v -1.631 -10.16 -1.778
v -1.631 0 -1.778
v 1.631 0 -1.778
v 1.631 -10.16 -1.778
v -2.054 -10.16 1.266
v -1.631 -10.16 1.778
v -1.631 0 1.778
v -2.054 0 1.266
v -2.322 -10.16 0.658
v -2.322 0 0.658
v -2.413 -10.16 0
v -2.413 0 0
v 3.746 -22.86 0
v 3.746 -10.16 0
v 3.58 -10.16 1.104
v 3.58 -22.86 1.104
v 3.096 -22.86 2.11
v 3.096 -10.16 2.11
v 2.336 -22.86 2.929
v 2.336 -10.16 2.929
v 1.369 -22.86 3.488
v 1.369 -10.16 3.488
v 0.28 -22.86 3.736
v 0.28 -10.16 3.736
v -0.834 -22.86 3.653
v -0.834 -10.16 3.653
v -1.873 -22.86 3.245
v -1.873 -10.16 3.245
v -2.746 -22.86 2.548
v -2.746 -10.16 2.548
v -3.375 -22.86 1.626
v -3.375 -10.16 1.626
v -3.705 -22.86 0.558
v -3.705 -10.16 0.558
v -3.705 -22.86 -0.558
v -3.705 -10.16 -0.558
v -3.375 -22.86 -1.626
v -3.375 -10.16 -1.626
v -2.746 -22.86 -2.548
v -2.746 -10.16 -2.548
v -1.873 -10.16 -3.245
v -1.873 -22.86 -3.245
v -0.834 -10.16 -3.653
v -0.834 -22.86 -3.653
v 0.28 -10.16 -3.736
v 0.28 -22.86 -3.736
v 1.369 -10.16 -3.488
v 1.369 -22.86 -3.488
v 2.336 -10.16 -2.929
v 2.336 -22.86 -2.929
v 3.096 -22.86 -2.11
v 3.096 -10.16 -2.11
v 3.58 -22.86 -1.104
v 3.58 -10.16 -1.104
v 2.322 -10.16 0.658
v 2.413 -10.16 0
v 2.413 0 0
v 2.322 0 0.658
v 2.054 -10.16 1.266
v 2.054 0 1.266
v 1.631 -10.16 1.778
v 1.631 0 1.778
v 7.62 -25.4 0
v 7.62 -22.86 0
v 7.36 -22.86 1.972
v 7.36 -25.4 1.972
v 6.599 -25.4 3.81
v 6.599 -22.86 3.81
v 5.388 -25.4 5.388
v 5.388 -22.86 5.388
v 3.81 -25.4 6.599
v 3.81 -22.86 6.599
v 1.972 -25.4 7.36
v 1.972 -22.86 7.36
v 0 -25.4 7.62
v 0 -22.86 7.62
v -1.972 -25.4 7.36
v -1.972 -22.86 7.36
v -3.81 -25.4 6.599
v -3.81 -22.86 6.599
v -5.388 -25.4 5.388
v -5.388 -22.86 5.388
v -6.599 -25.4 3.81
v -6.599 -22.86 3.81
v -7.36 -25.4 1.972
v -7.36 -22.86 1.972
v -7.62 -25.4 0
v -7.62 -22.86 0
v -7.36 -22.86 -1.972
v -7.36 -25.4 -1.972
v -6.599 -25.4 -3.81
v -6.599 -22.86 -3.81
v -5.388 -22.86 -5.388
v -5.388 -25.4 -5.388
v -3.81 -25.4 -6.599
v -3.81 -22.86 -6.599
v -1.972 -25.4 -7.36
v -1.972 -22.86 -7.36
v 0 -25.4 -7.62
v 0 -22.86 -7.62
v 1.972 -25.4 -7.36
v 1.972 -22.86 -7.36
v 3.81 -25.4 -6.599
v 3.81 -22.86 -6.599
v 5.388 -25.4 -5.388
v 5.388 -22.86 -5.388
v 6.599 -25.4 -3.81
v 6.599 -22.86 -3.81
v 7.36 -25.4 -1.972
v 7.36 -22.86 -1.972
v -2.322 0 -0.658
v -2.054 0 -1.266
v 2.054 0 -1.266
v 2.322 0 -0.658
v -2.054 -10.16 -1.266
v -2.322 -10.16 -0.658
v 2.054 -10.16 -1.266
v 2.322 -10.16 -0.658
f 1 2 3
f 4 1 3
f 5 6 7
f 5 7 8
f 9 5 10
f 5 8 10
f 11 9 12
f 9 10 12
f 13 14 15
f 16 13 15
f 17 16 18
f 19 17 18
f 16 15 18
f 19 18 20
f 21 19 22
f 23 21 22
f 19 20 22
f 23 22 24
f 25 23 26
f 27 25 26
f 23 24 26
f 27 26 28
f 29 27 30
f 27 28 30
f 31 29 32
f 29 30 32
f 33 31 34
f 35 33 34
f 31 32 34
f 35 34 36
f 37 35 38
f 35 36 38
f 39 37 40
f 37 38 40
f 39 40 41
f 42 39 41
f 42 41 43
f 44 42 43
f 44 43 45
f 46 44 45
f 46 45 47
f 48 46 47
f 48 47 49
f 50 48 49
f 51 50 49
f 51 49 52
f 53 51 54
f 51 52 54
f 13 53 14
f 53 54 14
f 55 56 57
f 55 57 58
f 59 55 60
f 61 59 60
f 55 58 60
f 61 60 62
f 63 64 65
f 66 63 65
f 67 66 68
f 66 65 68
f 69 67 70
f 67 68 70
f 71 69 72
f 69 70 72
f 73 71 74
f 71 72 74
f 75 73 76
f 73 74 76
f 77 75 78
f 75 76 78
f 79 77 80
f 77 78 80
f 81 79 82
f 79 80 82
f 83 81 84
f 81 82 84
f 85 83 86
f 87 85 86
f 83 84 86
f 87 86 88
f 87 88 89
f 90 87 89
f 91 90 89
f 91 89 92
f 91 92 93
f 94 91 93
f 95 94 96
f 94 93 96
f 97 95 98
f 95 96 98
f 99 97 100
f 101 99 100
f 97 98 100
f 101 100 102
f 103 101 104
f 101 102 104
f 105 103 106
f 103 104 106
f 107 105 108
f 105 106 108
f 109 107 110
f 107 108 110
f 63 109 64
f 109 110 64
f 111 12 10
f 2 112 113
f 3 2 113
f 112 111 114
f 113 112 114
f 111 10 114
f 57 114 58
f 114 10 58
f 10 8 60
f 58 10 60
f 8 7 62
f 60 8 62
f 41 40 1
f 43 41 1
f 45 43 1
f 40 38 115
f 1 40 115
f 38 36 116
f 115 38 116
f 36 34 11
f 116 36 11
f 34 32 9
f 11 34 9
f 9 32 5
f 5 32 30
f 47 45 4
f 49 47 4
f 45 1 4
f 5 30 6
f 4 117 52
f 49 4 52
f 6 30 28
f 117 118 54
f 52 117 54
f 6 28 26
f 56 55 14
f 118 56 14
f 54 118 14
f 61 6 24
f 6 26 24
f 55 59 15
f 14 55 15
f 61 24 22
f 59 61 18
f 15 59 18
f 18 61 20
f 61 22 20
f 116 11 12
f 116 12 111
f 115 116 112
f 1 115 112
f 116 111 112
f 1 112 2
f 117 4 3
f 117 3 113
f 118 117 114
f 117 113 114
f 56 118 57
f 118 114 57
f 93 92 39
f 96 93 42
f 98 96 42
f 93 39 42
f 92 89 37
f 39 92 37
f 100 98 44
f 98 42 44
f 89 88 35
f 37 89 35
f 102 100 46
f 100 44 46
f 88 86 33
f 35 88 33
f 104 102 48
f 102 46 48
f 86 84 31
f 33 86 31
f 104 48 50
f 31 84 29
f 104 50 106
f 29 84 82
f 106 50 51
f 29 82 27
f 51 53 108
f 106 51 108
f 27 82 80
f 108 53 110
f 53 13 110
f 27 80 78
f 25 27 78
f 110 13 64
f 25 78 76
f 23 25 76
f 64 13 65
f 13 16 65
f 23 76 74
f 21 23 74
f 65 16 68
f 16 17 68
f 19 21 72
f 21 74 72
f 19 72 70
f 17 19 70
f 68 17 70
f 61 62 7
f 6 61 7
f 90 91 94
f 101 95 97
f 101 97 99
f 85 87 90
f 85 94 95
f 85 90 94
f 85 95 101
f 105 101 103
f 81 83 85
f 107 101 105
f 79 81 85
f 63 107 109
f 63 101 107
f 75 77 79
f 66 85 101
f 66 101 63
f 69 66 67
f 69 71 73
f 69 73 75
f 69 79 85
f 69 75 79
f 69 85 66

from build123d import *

# Parameters (mm, degrees)
F1_DEPTH = 10.16
F2_R     = 3.7465
F3_DEPTH = 12.7
F4_R     = 7.62
F5_DEPTH = 2.54


with BuildPart() as f1:
    # F0 (on Front) → F1 (new body)
    with BuildSketch(Plane.XZ):
        with BuildLine():
            Line((-2.413, 0), (0, 0))
            Line((0, 0), (0, 1.778))
            Line((0, 1.778), (-1.631345, 1.778))
            ThreePointArc((-1.631345, 1.778), (-2.208959, 0.971117), (-2.413, 0))
        make_face()
        with BuildLine():
            Line((2.413, 0), (0, 0))
            Line((0, 0), (0, -1.778))
            Line((0, -1.778), (1.631345, -1.778))
            ThreePointArc((1.631345, -1.778), (2.208959, -0.971117), (2.413, 0))
        make_face()
        with BuildLine():
            Line((0, -1.778), (0, 0))
            Line((0, 0), (-2.413, 0))
            ThreePointArc((-2.413, 0), (-2.208959, -0.971117), (-1.631345, -1.778))
            Line((-1.631345, -1.778), (0, -1.778))
        make_face()
        with BuildLine():
            Line((0, 1.778), (0, 0))
            Line((0, 0), (2.413, 0))
            ThreePointArc((2.413, 0), (2.208959, 0.971117), (1.631345, 1.778))
            Line((1.631345, 1.778), (0, 1.778))
        make_face()
    extrude(amount=F1_DEPTH)

    # F2 (on face) → F3 (join)
    with BuildSketch(Plane.XZ.offset(10.16)):
        Circle(F2_R)
    extrude(amount=F3_DEPTH)

    # F4 (on face) → F5 (join)
    with BuildSketch(Plane.XZ.offset(22.86)):
        Circle(F4_R)
    extrude(amount=F5_DEPTH)


solid = f1.part
